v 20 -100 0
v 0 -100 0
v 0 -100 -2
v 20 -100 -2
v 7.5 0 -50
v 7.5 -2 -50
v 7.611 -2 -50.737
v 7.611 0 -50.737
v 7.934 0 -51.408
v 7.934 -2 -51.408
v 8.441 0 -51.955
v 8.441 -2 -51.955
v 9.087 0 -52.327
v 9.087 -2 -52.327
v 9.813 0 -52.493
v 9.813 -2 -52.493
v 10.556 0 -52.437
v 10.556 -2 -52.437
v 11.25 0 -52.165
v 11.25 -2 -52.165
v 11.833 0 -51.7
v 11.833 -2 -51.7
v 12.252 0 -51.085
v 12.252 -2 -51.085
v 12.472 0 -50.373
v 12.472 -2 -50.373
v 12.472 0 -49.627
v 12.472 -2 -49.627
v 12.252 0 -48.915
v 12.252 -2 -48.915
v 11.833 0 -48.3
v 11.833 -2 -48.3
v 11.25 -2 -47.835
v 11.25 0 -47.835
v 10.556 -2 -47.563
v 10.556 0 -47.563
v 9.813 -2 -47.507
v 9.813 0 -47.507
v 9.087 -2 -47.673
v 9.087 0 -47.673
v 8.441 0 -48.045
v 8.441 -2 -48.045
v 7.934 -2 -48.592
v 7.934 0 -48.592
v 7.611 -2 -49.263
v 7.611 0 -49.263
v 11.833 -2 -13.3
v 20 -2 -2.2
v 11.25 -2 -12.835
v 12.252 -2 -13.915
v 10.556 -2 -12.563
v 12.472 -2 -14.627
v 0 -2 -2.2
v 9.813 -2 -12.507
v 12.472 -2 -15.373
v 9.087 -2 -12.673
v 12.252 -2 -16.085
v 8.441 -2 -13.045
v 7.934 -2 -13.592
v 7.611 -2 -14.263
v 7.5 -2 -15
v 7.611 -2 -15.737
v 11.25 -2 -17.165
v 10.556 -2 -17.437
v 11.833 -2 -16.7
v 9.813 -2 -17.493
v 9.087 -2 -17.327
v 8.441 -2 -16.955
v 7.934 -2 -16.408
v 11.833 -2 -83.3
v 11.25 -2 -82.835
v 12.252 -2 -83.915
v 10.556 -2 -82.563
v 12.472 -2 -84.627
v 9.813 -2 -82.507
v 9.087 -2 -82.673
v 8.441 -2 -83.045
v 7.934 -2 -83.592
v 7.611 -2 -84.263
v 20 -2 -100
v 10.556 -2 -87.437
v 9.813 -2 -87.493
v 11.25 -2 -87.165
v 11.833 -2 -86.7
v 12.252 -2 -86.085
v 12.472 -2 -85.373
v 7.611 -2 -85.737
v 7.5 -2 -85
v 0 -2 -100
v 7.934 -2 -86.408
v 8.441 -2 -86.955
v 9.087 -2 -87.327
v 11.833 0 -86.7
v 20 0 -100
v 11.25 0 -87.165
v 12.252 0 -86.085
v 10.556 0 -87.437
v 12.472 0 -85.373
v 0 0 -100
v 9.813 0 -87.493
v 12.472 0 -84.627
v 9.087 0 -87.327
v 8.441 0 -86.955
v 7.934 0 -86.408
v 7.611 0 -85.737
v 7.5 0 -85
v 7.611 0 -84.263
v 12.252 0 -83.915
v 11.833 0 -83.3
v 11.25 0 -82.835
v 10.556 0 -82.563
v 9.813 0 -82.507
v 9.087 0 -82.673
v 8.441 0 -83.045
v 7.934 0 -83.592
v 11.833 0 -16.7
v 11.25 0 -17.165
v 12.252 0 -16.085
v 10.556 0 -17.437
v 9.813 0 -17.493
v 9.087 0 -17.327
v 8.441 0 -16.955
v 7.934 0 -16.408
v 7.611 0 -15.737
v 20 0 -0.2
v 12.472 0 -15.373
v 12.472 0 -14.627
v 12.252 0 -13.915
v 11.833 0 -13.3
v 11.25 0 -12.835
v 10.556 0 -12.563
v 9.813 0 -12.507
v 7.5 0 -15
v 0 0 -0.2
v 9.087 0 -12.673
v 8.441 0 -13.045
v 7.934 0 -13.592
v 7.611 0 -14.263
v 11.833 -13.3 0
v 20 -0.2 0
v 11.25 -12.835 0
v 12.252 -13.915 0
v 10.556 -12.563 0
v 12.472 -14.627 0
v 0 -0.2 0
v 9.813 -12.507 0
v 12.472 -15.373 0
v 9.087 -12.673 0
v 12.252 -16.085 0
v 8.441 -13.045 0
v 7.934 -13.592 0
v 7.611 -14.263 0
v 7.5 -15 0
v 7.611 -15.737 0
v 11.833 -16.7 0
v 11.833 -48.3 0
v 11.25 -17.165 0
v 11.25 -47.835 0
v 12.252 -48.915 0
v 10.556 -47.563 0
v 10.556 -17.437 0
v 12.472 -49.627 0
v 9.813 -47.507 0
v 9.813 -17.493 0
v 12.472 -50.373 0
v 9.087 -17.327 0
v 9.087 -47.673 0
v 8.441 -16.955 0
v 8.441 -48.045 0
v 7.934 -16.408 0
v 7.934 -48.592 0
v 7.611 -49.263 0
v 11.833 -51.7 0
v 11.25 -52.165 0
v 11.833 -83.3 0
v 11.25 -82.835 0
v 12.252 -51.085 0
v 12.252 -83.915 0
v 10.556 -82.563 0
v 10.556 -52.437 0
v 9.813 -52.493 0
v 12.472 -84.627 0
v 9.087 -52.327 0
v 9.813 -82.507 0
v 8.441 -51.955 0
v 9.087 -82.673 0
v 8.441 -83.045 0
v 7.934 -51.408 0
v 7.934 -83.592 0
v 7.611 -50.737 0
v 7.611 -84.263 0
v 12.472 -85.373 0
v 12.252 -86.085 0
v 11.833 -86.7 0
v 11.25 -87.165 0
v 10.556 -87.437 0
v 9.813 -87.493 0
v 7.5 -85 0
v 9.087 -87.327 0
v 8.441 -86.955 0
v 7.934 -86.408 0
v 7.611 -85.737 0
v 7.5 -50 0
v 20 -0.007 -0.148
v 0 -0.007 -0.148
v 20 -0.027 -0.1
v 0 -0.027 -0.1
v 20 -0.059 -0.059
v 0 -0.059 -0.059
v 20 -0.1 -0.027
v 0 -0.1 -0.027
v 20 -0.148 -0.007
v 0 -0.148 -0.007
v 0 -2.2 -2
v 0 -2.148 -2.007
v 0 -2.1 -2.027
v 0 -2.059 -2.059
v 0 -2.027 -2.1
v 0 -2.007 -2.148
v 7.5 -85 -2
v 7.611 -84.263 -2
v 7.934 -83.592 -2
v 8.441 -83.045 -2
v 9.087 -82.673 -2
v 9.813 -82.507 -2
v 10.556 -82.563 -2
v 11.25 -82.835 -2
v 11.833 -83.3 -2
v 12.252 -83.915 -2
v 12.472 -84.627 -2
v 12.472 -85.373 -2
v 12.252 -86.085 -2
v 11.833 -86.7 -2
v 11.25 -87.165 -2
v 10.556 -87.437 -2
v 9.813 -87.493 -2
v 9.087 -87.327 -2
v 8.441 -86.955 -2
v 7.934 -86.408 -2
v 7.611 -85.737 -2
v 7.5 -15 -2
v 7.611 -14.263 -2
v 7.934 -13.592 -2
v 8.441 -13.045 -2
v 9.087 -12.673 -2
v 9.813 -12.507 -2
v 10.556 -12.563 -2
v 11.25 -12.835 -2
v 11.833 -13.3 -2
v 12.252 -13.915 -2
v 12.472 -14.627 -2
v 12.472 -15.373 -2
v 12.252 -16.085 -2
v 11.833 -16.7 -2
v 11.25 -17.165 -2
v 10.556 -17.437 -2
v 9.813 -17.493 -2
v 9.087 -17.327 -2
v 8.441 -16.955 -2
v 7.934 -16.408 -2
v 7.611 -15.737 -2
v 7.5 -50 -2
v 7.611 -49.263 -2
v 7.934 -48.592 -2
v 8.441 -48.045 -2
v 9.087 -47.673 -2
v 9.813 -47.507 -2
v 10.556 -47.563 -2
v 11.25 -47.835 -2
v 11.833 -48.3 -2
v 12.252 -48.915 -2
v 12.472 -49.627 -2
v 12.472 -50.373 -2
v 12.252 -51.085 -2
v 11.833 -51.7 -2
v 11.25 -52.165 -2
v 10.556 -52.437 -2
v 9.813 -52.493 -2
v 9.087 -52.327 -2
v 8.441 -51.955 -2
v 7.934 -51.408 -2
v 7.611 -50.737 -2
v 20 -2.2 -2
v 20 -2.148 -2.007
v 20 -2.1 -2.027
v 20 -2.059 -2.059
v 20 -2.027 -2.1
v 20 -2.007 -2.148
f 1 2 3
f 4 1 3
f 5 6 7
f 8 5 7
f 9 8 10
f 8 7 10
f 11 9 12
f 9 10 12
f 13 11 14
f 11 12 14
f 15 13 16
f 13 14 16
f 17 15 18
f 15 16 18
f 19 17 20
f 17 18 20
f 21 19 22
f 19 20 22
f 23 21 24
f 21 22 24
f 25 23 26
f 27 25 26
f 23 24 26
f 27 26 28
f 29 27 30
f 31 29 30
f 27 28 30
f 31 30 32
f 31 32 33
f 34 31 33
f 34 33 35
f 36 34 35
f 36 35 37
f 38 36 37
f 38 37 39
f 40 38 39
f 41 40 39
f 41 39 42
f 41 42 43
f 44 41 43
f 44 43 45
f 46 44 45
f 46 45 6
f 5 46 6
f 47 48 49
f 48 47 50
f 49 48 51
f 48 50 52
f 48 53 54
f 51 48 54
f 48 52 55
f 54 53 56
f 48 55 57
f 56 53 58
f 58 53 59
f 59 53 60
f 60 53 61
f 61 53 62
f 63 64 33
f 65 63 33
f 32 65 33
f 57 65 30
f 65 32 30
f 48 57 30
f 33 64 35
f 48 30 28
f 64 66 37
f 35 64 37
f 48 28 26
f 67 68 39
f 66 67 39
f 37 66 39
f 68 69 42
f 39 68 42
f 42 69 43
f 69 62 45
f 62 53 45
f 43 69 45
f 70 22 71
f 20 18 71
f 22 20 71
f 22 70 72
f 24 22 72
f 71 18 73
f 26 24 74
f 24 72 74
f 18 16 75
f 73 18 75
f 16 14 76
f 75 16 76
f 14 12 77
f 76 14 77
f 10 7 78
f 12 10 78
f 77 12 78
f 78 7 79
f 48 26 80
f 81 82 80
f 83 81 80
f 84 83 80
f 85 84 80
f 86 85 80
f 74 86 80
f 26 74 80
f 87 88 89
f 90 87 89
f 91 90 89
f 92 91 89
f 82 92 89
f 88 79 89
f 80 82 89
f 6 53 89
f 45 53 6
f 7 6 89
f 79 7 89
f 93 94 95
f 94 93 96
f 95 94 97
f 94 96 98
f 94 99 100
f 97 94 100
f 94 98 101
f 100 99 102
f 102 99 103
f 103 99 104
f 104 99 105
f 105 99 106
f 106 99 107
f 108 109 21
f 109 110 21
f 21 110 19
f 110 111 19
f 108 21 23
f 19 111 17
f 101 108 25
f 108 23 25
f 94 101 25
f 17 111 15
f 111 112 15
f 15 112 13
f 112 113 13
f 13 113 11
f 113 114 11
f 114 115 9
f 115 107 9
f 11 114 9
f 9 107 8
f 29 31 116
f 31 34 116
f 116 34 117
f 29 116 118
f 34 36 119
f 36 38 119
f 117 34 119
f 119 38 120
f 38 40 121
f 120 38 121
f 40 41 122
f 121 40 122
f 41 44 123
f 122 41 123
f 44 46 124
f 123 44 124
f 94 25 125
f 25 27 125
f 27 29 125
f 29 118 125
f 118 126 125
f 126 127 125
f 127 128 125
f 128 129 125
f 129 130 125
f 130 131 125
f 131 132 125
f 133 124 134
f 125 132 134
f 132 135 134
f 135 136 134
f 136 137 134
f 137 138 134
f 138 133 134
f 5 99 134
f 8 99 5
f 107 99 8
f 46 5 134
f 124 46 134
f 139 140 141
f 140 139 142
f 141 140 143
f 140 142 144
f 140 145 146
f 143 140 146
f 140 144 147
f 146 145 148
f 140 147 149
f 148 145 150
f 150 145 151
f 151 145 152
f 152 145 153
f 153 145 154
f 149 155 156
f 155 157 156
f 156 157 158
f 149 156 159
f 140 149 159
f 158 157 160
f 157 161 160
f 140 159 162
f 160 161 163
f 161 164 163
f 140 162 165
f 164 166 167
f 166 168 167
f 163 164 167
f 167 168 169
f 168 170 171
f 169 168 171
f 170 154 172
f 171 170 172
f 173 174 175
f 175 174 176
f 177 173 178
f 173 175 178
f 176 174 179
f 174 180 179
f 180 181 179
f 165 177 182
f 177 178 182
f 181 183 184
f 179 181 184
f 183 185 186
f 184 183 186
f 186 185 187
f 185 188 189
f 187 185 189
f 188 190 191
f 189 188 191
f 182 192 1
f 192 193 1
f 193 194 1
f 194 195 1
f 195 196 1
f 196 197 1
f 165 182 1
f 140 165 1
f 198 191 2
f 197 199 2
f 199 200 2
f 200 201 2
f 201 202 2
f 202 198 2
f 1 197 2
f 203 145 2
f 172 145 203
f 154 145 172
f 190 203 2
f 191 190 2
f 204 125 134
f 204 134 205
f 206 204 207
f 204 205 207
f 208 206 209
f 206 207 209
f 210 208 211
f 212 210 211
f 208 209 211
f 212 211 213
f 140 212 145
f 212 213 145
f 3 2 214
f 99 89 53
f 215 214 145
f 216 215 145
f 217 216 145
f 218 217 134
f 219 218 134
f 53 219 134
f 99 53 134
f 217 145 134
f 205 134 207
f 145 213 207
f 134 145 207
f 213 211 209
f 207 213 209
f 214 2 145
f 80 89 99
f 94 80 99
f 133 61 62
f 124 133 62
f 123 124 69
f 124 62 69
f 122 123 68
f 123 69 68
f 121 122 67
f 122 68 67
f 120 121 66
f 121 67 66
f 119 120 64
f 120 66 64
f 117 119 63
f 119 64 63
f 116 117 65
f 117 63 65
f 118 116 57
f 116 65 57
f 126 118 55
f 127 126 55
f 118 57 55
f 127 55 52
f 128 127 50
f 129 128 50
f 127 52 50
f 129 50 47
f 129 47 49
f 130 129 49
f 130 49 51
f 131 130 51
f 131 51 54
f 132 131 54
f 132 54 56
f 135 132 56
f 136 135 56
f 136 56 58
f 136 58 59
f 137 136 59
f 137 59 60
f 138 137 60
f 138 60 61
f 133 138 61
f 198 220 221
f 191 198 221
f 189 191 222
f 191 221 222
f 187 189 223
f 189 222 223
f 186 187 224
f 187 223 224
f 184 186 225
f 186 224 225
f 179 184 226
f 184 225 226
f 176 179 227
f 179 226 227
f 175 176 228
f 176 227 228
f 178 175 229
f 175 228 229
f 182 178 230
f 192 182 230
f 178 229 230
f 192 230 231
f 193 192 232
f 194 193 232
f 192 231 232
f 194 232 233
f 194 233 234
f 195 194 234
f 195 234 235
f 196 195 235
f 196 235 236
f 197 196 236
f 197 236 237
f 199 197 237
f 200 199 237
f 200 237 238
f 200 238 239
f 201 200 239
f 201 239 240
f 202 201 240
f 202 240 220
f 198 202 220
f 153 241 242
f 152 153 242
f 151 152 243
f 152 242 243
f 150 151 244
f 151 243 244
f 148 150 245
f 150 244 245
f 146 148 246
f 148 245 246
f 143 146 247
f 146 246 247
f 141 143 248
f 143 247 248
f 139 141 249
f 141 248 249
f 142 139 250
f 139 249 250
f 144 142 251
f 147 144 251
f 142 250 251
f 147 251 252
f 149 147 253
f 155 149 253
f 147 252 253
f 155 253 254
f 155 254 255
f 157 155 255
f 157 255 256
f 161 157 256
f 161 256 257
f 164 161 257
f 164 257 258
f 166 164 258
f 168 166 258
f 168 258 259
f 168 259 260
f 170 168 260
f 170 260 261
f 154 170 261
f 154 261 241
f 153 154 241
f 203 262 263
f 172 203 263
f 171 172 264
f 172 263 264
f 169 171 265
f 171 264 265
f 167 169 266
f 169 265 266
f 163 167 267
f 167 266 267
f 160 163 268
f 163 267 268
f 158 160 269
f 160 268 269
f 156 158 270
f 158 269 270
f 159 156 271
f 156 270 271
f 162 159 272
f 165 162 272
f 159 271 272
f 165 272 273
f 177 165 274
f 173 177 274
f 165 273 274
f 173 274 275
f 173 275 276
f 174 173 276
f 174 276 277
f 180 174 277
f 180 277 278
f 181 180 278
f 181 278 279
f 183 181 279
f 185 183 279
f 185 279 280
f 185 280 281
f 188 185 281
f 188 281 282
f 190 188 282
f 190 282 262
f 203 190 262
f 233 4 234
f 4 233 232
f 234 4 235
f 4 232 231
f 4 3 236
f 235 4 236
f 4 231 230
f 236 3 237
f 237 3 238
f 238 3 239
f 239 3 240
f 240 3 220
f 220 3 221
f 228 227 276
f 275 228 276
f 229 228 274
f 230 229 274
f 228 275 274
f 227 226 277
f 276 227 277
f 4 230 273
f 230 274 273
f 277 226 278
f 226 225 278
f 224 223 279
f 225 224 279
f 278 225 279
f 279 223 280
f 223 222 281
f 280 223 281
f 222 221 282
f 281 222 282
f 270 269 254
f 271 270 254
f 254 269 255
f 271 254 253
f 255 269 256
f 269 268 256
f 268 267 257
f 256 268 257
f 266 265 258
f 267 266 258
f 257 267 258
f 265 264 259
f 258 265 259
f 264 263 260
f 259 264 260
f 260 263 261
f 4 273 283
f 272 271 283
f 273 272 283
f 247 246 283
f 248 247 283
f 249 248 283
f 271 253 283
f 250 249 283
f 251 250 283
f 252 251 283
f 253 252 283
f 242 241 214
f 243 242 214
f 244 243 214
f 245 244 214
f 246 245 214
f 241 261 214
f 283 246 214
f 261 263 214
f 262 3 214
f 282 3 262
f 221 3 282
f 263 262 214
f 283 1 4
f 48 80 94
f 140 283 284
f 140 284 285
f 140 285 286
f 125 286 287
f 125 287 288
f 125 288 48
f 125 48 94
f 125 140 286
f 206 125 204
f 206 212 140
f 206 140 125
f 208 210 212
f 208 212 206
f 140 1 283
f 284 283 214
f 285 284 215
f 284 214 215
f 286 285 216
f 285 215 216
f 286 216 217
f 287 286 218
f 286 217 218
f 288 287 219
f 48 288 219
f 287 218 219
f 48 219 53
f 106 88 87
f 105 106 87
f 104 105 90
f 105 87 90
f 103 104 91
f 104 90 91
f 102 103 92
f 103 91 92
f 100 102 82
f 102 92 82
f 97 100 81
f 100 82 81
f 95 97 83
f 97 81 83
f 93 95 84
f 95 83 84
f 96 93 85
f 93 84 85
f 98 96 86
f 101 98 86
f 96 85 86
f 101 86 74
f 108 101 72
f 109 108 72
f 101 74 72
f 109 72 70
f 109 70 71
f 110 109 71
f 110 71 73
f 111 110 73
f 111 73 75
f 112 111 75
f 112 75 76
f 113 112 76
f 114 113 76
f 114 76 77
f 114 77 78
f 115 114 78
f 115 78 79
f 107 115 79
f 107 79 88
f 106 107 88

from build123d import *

# Parameters (mm, degrees)
EXTRUSION1_DEPTH = 20
HOLE1_D          = 5
HOLE2_D          = 5


with BuildPart() as part:
    # Sketch1 → Extrusion1 (new body)
    with BuildSketch(Plane.YZ):
        with BuildLine():
            Line((0, -100), (0, -0.2))
            ThreePointArc((0, -0.2), (-0.058578644, -0.058578644), (-0.2, 0))
            Line((-0.2, 0), (-100, 0))
            Line((-100, 0), (-100, -2))
            Line((-100, -2), (-2.2, -2))
            ThreePointArc((-2.2, -2), (-2.058578644, -2.058578644), (-2, -2.2))
            Line((-2, -2.2), (-2, -100))
            Line((-2, -100), (0, -100))
        make_face()
    extrude(amount=EXTRUSION1_DEPTH)

    # Hole1 (through all)
    with Locations(Plane(origin=(0, 0, 0), x_dir=(1, 0, 0), z_dir=(0, 1, 0))):
        with Locations((10, 15), (10, 50), (10, 85)):
            Hole(HOLE1_D / 2)

    # Hole2 (through all)
    with Locations(Plane.XY):
        with Locations((10, -85), (10, -50), (10, -15)):
            Hole(HOLE2_D / 2)


solid = part.part
